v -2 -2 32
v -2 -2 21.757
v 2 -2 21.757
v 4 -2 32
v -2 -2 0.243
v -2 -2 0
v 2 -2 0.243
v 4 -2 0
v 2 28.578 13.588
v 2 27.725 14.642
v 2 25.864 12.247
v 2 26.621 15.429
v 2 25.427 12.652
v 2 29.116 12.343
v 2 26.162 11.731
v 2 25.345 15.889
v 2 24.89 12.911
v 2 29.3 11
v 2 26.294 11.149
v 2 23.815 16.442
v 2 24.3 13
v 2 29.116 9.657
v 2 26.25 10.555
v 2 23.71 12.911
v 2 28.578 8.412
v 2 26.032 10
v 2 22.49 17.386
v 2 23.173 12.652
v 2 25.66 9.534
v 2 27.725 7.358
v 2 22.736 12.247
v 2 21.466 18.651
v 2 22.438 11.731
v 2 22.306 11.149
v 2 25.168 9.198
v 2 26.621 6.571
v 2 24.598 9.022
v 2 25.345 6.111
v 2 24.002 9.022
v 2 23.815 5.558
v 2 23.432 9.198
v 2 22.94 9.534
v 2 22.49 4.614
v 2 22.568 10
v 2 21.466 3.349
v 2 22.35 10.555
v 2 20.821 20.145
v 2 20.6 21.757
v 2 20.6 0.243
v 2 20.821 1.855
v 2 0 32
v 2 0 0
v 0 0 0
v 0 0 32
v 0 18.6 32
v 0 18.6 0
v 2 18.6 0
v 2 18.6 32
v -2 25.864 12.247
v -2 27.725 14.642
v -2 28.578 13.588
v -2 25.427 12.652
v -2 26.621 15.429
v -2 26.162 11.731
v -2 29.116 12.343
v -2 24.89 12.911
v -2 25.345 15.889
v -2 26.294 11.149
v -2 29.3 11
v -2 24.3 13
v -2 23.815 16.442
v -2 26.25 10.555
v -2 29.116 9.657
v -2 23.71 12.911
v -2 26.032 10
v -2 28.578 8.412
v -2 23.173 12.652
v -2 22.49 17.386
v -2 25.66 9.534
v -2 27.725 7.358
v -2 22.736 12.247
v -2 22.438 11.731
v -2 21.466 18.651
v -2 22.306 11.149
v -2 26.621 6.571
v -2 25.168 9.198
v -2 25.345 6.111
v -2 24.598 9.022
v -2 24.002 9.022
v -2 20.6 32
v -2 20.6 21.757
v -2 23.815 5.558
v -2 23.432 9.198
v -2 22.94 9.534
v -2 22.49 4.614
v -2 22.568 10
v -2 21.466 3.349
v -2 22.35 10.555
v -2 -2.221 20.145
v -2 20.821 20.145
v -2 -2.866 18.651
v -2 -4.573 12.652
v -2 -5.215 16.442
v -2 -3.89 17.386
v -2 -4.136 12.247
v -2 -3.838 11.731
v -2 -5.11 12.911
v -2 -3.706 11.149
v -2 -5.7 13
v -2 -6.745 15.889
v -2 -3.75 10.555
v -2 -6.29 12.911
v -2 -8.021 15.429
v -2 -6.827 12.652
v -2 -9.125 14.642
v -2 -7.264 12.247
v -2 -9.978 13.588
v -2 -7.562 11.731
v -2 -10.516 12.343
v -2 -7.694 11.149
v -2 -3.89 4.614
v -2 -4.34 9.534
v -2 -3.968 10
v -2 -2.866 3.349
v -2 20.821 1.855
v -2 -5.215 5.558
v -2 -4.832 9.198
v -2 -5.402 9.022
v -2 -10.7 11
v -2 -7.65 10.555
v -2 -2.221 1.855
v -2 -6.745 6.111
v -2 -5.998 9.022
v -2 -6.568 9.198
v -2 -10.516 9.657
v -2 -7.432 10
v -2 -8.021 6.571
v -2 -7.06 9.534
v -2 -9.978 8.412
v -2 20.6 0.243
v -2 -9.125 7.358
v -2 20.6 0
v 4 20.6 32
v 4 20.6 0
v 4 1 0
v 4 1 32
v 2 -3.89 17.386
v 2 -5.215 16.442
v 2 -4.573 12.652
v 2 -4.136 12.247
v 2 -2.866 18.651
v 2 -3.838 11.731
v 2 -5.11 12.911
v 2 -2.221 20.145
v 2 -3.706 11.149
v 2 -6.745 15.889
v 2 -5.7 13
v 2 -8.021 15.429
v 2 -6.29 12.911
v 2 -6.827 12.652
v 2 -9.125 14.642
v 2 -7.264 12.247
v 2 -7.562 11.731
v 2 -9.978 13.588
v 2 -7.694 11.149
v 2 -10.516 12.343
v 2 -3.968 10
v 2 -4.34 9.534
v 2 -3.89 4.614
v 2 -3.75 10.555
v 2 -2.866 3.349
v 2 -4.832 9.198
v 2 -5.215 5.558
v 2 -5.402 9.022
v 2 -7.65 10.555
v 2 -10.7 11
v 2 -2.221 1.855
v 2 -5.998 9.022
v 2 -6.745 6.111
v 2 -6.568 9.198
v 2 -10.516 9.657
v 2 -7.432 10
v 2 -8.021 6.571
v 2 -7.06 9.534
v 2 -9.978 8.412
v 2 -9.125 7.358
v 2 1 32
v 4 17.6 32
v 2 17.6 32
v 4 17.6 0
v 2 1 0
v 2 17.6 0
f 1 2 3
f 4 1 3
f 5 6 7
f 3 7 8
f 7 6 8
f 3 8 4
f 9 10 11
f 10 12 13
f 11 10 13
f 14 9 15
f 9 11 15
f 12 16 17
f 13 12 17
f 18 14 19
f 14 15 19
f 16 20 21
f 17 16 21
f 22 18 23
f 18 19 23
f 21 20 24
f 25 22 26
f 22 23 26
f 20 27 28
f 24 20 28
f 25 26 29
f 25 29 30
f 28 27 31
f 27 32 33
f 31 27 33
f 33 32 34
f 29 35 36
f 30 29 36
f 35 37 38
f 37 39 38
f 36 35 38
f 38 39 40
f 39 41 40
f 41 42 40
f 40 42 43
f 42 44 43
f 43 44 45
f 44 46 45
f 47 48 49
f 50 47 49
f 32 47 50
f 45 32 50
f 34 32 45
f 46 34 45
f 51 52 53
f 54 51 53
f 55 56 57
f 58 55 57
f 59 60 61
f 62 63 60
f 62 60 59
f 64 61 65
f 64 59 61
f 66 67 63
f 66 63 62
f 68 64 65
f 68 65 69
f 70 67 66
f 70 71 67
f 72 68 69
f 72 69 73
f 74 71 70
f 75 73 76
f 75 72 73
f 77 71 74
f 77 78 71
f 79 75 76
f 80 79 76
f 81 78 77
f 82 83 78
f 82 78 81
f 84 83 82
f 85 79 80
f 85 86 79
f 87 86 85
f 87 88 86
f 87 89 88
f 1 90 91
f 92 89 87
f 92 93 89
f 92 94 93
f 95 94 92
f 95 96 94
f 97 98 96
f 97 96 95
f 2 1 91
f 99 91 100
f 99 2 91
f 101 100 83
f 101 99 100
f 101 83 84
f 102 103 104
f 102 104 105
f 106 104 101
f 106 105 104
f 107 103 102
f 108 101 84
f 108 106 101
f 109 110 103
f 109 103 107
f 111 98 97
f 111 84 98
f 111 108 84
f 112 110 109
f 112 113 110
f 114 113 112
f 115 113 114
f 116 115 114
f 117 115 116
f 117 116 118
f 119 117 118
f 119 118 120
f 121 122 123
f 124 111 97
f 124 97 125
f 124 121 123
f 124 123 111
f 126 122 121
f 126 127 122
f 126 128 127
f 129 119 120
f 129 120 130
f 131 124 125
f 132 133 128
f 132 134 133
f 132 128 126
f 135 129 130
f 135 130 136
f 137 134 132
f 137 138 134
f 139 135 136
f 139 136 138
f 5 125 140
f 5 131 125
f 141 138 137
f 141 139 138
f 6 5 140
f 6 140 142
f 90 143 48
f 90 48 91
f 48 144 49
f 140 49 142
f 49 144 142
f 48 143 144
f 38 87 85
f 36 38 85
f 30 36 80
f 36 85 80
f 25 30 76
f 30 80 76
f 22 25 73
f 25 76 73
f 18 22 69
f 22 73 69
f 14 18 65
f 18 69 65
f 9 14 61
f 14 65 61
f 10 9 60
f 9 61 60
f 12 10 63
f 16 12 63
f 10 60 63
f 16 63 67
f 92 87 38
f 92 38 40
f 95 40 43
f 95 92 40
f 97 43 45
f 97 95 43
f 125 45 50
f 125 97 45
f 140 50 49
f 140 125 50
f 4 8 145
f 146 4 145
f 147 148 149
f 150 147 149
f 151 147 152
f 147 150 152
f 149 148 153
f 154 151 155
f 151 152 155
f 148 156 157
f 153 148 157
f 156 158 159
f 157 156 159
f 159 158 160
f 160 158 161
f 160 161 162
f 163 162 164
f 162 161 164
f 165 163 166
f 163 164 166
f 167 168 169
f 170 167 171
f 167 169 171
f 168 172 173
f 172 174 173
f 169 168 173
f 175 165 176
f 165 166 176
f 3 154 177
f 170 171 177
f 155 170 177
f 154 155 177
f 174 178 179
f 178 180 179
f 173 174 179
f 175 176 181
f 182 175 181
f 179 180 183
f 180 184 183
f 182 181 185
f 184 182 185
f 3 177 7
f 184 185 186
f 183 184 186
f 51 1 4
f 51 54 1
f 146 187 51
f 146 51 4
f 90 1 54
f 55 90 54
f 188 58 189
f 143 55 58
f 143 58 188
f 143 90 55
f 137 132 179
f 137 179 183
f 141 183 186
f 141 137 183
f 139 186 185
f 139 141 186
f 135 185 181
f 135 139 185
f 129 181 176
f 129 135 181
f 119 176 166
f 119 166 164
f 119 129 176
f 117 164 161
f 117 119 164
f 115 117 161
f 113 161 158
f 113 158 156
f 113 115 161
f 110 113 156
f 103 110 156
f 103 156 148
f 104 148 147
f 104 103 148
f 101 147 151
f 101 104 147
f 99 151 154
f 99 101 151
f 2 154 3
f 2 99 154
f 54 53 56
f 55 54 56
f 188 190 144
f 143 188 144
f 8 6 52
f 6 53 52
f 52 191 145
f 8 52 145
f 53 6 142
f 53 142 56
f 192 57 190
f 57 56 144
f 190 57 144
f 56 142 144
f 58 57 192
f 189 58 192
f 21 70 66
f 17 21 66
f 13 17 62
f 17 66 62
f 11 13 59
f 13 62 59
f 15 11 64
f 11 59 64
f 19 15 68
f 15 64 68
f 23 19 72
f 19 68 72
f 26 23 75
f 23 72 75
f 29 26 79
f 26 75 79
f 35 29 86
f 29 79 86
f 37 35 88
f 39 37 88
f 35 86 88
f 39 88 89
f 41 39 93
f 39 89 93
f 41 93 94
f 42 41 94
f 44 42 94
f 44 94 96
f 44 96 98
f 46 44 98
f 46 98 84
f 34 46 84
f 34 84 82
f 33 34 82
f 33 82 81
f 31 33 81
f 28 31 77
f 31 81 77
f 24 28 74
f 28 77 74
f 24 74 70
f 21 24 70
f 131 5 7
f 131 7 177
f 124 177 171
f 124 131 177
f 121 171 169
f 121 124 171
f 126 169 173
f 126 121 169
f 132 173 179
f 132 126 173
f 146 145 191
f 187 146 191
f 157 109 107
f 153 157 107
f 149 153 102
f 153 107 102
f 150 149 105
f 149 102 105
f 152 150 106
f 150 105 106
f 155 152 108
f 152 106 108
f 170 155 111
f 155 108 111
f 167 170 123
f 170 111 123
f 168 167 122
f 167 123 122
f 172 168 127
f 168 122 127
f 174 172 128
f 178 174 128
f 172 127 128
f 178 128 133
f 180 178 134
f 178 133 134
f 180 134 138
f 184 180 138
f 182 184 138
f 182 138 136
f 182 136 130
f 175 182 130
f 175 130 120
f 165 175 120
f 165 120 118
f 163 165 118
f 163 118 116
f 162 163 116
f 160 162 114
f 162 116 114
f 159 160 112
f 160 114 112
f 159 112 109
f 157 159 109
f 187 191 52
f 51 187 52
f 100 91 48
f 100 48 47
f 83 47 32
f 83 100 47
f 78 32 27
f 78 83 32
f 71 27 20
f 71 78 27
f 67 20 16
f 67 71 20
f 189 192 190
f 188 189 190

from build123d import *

# Parameters (mm, degrees)
BOSS_EXTRU_1_DEPTH = 32
ESQUISSE2_R        = 2
BOSS_EXTRU_2_DEPTH = 4
CONG_1_R           = 6


with BuildPart() as part:
    # Esquisse1 → Boss.-Extru.1 (new body)
    with BuildSketch(Plane.XY):
        Polygon((4, -2), (4, 1), (2, 1), (2, 0), (0, 0), (0, 18.6), (2, 18.6), (2, 17.6), (4, 17.6), (4, 20.6), (-2, 20.6), (-2, -2), align=None)
    extrude(amount=BOSS_EXTRU_1_DEPTH)

    # Esquisse2 → Boss.-Extru.2 (add)
    # profile 1 of 2: a face of its own
    with BuildSketch(Plane.ZY.offset(2)):
        with BuildLine():
            Line((6, -2), (6, -5.7))
            ThreePointArc((6, -5.7), (11, -10.7), (16, -5.7))
            Line((16, -5.7), (16, -2))
            Line((16, -2), (6, -2))
        make_face()
        with Locations((11, -5.7)):
            Circle(ESQUISSE2_R, mode=Mode.SUBTRACT)
    # profile 2 of 2: a face of its own
    with BuildSketch(Plane.ZY.offset(2)):
        with BuildLine():
            Line((6, 20.6), (6, 24.3))
            ThreePointArc((6, 24.3), (11, 29.3), (16, 24.3))
            Line((16, 24.3), (16, 20.6))
            Line((16, 20.6), (6, 20.6))
        make_face()
        with Locations((11, 24.3)):
            Circle(ESQUISSE2_R, mode=Mode.SUBTRACT)
    extrude(amount=-BOSS_EXTRU_2_DEPTH)

    # Congé1
    # the kernel refuses this fillet: 6 mm, written as the material it adds along each edge
    with BuildSketch(Plane(origin=(-2, -2, 16), x_dir=(0, 0, 1), z_dir=(1, 0, 0)), Plane(origin=(-2, 20.6, 6), x_dir=(0, 0, -1), z_dir=(1, 0, 0))) as cong_1_piece_1:
        with BuildLine():
            CenterArc((5.756858277, 6), CONG_1_R, 192.069082524, 77.930917476)
            Line((-0.110518965, 4.745454545), (-0.697256689, 4.62))
            ThreePointArc((-0.697256689, 4.62), (-0.6, 3.7), (-0.6, 0))
            Line((-0.6, 0), (0, -0.6))
            Line((0, -0.6), (5.756858277, -0.6))
            Line((5.756858277, -0.6), (5.756858277, 0))
        make_face()
    extrude(amount=4)
    with BuildSketch(Plane(origin=(-2, 20.6, 16), x_dir=(0, 0, 1), z_dir=(1, 0, 0)), Plane(origin=(-2, -2, 6), x_dir=(0, 0, -1), z_dir=(1, 0, 0))) as cong_1_piece_2:
        with BuildLine():
            CenterArc((5.756858277, -6), CONG_1_R, 90, 77.930917476)
            Line((-0.110518965, -4.745454545), (-0.697256689, -4.62))
            ThreePointArc((-0.697256689, -4.62), (-0.6, -3.7), (-0.6, 0))
            Line((-0.6, 0), (0, 0.6))
            Line((0, 0.6), (5.756858277, 0.6))
            Line((5.756858277, 0.6), (5.756858277, 0))
        make_face()
    extrude(amount=4)


solid = part.part
